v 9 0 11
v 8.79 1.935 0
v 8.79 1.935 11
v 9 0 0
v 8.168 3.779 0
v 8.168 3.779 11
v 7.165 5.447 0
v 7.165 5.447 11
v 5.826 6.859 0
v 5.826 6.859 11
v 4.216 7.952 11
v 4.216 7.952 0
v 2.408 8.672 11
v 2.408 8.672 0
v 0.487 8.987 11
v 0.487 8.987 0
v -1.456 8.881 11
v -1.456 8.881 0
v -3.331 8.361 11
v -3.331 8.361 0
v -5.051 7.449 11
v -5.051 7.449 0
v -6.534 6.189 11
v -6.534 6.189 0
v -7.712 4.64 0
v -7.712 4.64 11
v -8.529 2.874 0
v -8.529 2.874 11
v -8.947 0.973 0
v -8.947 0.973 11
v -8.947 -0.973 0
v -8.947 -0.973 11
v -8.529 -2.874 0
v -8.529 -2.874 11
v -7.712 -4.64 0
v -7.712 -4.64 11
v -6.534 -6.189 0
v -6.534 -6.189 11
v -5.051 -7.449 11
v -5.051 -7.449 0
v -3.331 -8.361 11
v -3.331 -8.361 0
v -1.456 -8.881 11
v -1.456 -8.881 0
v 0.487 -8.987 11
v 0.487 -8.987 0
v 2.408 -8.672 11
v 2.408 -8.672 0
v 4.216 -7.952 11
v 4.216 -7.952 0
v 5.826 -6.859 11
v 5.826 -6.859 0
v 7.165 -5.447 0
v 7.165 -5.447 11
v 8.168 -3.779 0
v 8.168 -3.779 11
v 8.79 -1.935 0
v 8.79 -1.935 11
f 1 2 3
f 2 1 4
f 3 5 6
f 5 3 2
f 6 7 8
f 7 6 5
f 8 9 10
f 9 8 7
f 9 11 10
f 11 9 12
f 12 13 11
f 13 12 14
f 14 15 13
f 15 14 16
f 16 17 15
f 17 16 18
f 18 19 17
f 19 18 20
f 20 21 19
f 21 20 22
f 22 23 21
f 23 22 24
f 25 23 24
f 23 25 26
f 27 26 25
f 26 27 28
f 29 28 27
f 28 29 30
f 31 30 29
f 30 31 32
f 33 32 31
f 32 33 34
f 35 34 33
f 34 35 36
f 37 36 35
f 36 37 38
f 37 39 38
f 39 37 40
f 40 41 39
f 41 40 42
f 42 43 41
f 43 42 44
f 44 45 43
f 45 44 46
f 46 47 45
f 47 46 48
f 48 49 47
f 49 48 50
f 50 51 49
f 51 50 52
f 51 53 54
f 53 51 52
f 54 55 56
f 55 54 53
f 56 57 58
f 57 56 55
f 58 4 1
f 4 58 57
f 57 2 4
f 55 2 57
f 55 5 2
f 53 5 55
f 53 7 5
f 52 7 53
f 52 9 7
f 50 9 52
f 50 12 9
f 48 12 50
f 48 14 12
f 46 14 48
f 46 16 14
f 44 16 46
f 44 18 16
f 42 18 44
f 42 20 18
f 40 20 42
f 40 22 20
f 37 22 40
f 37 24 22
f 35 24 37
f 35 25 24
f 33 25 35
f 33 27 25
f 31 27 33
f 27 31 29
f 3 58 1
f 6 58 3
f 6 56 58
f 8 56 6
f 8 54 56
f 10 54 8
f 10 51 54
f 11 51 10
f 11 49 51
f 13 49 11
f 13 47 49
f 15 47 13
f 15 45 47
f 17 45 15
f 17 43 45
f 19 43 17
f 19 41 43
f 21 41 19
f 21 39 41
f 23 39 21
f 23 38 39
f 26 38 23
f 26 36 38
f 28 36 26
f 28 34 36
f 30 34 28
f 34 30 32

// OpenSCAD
// Generated by SolidPython 1.0.1 on 2020-07-29 00:46:44


cylinder(h = 11, r1 = 9, r2 = 9);
/***********************************************
*********      SolidPython code:      **********
************************************************
 
# import packages: SolidPython
from solid import *
from solid.utils import *
from itertools import chain, combinations, permutations


class Resize:

    def __init__(self, scad_file):
        self.scad_file = scad_file
        #self.scad_file = import_scad(scad_file)
        # cone/cylinder param:
        self.r1 = 0
        self.r2 = 0
        self.h = 0
        # rectangular prism param:
        self.w = 0
        self.l = 0
        # ellipse param:
        self.r = 0

    # import OpenScad code (file name corresponds to shape)


    # classify shape + parameters
    def assign(self, param1, param2, param3):
        if self.scad_file == 'cone.scad':
            self.r1 = param1
            self.r2 = param2
            self.h = param3
        elif self.scad_file == 'cylinder.scad':
            self.r1 = param1
            self.r2 = param2
            self.h = param3
        elif self.scad_file == 'rectangularPrism.scad':
            self.h = param1
            self.l = param2
            self.w = param3
        else:
            self.r = param1
            self.h = param2

    # resize parameters
    def iterate(self):
        x = range(3, 20, 2)
        i = 1
        if self.scad_file == 'cone.scad':
            tempList = list(permutations(x, 2))
            for temp in tempList:
                param1 = temp[0]
                param2 = temp[1]
                filepath = 'produced_scad_files/' + 'cone' + str(param1) + '_' + str(param2) + '_' + '.scad'
                scad_render_to_file(cylinder(h=param1, r1=param2, r2=0), filepath)

        elif self.scad_file == 'cylinder.scad':
            tempList = list(permutations(x, 3))
            for temp in tempList:
                param1 = temp[0]
                param2 = temp[1]
                filepath = 'produced_scad_files/' + 'cylinder' + str(param1) + '_' + str(param2) + '_' + '.scad'
                scad_render_to_file(cylinder(h=param1, r1=param2, r2=param2), filepath)

        elif self.scad_file == 'rectangularPrism.scad':
            tempList = list(permutations(x, 3))
            for temp in tempList:
                param1 = temp[0]
                param2 = temp[1]
                param3 = temp[2]
                filepath = 'produced_scad_files/' + 'rectangularPrism' + str(param1) + '_' + str(param2) + '_' + str(
                    param3) + '.scad'
                scad_render_to_file(cube(size=(param1, param2, param3)), filepath)

        elif self.scad_file == 'ellipse.scad':
            tempList = list(permutations(x, 4))
            for temp in tempList:
                param1 = temp[0]
                param2 = temp[1]
                param3 = temp[2]
                param4 = temp[3]
                filepath = 'produced_scad_files/' + 'ellipse' + str(param1) + '_' + str(param2) + '_' + str(param3) + '_' + str(param4) + '.scad'
                scad_render_to_file(scale([param1, param2, param3])(sphere(r=param4)), filepath)

    def render_to_scadfile(self):
        scad_render_to_file(scad, 'example.scad') 
 
************************************************/
